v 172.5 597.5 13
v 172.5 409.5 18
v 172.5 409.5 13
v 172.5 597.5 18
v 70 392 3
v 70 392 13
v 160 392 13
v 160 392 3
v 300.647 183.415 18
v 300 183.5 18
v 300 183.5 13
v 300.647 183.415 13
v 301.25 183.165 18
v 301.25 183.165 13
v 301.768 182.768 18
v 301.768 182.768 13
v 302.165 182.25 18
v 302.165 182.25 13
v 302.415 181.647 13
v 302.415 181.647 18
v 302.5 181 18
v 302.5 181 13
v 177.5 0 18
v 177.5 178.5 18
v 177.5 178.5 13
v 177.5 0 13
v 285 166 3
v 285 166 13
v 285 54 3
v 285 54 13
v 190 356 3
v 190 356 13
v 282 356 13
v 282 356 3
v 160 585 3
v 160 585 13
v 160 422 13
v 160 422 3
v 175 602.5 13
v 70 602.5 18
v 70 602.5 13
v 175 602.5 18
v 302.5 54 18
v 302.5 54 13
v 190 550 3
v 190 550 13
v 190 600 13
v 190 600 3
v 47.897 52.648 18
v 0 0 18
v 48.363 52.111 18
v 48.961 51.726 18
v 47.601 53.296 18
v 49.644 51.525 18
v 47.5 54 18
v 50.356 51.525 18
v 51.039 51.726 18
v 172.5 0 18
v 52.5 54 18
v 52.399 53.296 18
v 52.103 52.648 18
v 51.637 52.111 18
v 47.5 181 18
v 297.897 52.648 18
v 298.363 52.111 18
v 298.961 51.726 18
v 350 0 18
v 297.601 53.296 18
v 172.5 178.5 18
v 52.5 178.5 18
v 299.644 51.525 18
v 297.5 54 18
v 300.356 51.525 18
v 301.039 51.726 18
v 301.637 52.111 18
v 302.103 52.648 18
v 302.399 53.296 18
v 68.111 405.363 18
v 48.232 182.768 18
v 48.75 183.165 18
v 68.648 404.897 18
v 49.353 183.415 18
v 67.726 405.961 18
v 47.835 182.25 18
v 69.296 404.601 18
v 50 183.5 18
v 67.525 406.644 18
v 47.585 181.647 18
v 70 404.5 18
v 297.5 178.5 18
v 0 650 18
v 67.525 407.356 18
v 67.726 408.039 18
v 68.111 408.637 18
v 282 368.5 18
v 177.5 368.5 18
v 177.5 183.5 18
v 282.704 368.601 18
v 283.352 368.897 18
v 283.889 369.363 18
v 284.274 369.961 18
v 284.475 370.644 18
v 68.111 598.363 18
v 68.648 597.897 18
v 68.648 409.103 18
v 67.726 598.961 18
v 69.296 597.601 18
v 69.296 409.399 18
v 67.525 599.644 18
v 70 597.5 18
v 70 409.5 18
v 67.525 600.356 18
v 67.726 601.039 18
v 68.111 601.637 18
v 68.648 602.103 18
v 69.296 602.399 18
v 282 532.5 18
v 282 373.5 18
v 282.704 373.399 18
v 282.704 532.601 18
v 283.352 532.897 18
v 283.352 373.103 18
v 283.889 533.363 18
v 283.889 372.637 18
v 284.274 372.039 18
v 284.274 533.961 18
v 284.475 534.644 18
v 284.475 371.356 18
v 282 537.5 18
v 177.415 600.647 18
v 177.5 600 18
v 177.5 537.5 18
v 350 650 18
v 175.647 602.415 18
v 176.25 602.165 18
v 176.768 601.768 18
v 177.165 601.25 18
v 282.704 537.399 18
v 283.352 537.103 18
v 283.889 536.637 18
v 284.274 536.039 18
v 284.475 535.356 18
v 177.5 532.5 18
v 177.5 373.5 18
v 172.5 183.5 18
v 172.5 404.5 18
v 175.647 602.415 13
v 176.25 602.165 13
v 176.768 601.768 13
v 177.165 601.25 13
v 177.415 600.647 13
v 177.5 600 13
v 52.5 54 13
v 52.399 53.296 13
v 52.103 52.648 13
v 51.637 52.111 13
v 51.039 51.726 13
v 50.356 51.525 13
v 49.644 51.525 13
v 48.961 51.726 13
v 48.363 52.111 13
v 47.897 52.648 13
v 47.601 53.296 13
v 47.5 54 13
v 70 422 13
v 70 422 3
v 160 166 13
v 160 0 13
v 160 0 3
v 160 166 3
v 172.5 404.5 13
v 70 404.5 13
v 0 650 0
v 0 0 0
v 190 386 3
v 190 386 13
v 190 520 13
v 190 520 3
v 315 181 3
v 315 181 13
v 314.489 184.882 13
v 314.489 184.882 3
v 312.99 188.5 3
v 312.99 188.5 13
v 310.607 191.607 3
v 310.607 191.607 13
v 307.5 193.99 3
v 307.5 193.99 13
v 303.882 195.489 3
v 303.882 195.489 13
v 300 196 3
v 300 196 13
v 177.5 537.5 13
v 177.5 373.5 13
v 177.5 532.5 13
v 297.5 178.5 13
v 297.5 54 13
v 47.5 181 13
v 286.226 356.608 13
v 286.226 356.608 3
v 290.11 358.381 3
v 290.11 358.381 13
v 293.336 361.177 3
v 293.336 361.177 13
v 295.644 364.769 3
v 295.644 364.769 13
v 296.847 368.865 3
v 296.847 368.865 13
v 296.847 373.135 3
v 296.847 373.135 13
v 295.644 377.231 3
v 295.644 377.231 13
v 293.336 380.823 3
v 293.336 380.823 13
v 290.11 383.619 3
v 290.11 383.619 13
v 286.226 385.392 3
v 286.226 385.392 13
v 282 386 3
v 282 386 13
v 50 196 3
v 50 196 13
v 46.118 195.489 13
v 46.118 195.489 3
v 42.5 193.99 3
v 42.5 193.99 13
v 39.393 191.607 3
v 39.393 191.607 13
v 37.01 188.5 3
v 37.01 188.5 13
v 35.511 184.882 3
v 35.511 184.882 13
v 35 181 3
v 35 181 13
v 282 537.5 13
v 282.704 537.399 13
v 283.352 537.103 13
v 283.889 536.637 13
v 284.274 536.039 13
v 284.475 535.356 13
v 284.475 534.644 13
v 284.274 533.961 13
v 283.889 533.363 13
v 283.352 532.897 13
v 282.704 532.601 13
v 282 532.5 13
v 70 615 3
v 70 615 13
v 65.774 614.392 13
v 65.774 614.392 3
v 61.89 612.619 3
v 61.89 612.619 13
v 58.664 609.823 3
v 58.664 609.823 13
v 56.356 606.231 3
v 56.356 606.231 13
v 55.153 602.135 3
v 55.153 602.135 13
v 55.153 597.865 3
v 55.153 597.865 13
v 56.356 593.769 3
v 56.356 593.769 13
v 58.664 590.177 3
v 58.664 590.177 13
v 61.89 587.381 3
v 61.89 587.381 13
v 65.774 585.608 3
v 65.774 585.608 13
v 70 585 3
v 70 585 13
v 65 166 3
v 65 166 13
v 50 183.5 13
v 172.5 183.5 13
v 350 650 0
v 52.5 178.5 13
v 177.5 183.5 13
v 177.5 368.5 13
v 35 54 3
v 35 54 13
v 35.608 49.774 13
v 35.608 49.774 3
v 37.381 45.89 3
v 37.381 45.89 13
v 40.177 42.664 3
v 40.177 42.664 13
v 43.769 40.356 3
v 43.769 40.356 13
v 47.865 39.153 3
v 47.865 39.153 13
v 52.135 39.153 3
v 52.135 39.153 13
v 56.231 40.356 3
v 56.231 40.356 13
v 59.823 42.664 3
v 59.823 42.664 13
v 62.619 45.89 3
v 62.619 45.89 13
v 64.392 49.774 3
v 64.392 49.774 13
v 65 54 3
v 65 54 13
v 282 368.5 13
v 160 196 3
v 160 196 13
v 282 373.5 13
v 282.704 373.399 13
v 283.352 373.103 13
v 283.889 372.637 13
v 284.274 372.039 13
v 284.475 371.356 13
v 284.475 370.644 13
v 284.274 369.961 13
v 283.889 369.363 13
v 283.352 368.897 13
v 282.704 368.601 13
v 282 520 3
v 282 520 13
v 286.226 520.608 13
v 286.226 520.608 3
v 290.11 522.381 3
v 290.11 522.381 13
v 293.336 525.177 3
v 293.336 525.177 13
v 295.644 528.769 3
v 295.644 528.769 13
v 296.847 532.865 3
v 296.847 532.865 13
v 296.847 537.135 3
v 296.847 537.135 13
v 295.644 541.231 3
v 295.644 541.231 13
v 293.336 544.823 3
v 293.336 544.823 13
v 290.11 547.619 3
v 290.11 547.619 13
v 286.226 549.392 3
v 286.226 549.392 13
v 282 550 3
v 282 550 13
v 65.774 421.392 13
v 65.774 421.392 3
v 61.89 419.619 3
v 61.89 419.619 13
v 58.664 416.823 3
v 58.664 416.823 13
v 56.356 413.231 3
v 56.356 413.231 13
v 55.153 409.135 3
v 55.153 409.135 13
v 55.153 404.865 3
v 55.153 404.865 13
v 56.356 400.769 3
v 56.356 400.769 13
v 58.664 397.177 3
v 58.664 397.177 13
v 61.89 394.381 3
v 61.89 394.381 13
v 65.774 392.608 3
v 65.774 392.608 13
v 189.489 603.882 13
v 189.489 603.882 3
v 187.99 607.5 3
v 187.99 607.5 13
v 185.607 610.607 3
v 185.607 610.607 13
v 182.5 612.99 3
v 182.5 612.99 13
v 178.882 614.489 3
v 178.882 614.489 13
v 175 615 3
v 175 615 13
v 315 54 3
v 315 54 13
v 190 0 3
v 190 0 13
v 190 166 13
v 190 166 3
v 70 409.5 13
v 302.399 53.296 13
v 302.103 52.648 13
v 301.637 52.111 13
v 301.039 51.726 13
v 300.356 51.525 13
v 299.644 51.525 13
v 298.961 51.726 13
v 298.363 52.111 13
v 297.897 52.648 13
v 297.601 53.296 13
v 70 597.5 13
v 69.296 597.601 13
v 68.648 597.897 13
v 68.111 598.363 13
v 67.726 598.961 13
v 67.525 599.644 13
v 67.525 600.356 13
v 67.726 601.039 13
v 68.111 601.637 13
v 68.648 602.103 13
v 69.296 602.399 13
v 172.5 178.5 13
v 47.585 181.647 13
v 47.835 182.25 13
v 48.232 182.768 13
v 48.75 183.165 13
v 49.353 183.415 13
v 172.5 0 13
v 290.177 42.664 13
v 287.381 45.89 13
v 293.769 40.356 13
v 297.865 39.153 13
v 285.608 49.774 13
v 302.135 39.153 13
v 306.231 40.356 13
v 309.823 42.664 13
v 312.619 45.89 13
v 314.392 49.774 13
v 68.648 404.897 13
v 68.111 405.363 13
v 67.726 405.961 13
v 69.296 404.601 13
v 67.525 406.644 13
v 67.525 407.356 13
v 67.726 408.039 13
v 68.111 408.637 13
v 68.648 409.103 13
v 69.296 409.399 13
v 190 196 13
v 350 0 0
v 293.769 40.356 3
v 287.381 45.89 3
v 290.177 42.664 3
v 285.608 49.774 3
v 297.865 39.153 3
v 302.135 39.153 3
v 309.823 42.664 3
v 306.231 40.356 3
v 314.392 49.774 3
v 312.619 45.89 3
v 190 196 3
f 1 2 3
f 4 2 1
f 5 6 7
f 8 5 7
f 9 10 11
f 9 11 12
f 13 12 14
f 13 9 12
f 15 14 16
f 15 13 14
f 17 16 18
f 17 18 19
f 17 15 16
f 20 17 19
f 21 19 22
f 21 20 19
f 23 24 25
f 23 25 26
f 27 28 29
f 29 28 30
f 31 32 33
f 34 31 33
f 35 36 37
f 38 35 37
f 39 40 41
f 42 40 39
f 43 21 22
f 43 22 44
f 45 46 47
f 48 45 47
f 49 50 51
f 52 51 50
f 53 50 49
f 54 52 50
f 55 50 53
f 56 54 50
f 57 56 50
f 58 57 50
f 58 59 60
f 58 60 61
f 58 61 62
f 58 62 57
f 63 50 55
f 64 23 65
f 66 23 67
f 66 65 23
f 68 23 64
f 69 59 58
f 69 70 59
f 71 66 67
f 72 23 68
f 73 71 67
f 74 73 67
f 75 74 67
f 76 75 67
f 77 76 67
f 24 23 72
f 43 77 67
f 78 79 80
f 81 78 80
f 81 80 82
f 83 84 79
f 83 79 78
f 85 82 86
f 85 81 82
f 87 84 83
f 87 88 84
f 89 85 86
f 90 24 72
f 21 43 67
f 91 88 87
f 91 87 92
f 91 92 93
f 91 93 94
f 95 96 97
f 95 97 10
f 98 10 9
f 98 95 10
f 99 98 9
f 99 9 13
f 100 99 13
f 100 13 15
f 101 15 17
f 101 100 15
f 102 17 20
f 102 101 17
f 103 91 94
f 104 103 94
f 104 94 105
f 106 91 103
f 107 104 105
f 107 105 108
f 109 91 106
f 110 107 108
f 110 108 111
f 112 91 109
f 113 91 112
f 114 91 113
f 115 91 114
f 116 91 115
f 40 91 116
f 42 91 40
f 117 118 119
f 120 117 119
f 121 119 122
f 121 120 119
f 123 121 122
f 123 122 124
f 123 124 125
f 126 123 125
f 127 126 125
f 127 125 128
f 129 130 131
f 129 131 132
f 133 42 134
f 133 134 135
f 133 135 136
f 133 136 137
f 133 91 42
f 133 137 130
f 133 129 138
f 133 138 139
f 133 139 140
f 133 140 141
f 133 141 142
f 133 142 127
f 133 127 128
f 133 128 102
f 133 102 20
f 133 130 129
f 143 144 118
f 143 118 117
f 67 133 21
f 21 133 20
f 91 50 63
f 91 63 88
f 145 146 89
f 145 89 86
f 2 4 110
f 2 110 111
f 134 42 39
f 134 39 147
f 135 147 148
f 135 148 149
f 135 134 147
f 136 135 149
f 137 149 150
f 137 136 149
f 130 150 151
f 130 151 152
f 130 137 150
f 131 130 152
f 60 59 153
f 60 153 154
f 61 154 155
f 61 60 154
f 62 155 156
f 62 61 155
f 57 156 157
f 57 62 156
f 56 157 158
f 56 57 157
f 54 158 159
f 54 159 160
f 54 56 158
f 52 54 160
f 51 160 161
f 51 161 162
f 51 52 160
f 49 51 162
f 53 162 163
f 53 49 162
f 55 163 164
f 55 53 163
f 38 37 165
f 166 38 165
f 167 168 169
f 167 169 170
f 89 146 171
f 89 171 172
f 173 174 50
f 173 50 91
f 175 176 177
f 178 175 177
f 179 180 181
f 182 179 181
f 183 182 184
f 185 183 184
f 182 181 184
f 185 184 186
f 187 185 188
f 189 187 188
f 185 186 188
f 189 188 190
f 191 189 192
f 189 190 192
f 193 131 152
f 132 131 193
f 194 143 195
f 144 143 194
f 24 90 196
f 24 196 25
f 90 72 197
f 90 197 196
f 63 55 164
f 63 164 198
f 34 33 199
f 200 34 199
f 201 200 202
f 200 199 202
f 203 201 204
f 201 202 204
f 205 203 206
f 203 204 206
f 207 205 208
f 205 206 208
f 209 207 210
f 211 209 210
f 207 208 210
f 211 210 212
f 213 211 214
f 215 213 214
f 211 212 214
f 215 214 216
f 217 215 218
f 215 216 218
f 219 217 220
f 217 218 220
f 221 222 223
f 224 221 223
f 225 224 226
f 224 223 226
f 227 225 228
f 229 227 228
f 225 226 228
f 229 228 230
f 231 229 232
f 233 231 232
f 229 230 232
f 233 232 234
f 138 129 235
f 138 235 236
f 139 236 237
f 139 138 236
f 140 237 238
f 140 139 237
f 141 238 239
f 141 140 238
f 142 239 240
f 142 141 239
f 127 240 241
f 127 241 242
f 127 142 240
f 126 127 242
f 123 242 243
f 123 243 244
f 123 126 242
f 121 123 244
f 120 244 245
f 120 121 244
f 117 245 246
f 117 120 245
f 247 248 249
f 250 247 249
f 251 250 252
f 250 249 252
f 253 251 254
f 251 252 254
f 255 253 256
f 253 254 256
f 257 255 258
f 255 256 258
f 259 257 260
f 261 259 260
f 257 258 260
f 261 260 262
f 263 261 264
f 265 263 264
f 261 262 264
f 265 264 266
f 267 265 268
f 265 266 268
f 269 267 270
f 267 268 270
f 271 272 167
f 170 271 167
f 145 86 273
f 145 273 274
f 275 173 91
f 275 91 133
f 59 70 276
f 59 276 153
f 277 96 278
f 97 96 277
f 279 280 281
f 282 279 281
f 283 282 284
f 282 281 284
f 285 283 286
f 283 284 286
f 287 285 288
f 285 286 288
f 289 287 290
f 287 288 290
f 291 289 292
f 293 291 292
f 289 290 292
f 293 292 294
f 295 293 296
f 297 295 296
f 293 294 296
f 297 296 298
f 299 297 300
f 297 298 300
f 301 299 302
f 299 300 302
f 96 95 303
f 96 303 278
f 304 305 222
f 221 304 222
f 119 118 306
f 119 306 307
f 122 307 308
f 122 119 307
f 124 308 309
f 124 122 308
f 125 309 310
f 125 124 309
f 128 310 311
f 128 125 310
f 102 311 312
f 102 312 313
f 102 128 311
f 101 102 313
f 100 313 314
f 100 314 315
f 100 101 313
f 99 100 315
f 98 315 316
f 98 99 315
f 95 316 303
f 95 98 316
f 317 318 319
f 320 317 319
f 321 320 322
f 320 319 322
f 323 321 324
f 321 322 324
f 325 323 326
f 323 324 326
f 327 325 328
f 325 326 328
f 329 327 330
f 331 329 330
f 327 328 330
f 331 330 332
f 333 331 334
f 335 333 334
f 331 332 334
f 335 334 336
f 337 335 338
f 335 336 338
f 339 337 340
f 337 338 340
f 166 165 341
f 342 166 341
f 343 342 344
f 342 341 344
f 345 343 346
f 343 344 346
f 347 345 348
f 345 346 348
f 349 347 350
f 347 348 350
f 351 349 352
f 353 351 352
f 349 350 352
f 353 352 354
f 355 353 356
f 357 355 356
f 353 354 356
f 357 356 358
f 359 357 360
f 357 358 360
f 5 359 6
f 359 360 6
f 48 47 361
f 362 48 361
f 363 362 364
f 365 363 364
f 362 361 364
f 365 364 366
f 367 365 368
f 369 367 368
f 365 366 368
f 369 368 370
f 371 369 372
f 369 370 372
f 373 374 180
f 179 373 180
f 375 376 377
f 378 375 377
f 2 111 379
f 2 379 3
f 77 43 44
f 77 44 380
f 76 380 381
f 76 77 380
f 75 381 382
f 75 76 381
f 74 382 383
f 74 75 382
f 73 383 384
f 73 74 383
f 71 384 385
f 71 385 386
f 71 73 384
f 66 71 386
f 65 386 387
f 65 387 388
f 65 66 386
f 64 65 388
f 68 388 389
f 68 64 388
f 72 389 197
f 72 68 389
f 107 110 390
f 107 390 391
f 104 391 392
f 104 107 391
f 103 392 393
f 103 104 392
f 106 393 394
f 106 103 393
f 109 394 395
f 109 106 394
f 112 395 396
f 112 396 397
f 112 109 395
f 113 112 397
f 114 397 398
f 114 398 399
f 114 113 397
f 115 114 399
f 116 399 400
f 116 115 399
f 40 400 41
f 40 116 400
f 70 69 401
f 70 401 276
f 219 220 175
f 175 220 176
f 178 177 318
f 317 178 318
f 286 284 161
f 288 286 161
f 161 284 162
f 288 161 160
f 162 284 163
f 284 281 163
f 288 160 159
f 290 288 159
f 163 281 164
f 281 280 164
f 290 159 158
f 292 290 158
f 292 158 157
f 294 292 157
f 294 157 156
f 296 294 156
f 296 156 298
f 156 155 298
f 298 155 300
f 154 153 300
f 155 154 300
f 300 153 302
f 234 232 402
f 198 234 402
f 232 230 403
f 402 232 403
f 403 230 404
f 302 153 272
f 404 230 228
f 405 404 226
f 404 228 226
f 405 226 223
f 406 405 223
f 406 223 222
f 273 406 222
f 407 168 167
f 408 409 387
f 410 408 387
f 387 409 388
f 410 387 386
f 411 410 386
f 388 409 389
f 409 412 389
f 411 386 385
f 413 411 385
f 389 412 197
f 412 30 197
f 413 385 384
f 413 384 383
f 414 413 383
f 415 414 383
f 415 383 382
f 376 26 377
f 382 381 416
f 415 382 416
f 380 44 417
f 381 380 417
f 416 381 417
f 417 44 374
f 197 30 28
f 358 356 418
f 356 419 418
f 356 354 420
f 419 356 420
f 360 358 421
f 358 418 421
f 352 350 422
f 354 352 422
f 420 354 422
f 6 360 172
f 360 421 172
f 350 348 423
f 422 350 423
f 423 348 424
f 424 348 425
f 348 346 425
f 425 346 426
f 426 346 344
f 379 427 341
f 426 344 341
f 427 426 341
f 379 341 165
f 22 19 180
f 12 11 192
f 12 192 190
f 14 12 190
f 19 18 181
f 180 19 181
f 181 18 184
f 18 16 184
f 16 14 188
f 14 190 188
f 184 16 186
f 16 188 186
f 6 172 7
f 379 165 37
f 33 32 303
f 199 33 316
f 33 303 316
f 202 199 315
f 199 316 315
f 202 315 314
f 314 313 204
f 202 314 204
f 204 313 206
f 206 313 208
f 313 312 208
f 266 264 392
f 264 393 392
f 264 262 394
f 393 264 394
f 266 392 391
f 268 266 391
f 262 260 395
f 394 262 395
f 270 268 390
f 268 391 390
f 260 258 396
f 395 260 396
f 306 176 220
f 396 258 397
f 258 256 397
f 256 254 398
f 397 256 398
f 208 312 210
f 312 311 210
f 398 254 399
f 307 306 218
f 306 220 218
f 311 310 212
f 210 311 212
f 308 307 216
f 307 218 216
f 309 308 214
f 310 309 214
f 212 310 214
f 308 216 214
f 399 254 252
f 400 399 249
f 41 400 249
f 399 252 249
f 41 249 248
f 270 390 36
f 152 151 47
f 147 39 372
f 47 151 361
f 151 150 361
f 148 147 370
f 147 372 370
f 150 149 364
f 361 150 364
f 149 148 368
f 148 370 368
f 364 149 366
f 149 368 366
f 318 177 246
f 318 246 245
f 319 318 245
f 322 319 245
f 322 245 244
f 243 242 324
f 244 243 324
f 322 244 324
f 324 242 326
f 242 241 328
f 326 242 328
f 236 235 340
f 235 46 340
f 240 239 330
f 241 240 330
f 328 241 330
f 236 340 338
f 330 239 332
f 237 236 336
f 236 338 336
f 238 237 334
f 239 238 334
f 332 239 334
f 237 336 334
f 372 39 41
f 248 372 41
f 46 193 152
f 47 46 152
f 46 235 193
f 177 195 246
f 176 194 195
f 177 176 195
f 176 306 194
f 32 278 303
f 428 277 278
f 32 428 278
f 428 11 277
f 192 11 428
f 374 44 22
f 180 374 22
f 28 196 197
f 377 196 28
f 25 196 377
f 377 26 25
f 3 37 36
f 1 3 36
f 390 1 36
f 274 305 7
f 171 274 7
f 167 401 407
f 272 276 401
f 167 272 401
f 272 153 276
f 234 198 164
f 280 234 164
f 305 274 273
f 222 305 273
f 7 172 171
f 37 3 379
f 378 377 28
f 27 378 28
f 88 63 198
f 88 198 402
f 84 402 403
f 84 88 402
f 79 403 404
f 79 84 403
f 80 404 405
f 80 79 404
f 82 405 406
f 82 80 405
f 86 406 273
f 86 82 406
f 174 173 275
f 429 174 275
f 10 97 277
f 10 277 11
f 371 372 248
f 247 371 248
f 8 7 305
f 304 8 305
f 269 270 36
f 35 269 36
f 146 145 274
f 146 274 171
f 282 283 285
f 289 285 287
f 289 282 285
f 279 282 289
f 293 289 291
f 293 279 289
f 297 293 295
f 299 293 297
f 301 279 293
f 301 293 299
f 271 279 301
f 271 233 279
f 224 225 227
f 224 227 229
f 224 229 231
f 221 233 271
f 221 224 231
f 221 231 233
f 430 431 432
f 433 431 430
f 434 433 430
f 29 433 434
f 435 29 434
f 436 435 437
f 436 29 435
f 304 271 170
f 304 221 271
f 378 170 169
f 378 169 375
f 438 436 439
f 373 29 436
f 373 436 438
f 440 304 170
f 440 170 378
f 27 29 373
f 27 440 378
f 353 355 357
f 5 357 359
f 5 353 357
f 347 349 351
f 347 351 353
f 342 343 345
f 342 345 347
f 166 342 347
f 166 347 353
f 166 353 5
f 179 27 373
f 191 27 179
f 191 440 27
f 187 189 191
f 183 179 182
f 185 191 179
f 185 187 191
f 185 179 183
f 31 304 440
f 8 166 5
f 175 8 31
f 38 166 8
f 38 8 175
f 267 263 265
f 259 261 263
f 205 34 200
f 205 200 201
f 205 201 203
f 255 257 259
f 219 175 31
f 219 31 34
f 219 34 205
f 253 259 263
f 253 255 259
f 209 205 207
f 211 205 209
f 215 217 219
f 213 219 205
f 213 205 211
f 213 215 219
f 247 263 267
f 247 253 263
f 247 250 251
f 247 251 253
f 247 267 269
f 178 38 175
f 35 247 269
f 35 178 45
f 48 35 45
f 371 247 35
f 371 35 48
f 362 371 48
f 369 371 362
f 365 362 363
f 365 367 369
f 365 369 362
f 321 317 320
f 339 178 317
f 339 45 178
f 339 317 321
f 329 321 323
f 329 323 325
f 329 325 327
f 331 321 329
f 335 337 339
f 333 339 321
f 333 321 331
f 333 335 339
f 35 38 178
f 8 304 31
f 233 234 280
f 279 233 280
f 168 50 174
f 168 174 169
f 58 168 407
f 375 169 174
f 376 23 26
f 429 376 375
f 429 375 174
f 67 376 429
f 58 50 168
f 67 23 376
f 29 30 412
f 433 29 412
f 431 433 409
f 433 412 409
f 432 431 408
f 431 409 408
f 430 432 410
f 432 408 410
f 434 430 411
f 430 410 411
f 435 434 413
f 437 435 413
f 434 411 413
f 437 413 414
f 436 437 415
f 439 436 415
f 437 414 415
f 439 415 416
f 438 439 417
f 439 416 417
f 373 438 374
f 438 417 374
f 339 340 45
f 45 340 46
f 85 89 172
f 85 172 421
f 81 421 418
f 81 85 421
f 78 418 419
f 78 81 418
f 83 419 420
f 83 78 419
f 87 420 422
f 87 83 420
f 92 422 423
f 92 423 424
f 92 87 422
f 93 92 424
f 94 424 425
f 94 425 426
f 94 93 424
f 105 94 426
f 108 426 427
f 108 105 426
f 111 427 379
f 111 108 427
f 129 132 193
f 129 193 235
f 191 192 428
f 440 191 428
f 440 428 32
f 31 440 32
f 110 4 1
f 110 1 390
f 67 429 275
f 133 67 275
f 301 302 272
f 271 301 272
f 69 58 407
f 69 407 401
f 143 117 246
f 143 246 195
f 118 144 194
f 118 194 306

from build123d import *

# Parameters (mm, degrees)
SKICA1_W                 = 350
SKICA1_H                 = 650
P_IDAT_VYSUNUT_M2_DEPTH  = 18
VETSI_W                  = 30
VETSI_H                  = 166
VETSI_H_2                = 30
ODEBRAT_VYSUNUT_M1_DEPTH = 15
P_IDAT_VYSUNUT_M3_DEPTH  = 5


with BuildPart() as part:
    # Skica1 → Přidat vysunutím2 (new body)
    with BuildSketch(Plane.XY):
        with Locations((175, 325)):
            Rectangle(SKICA1_W, SKICA1_H)
    extrude(amount=P_IDAT_VYSUNUT_M2_DEPTH)

    # vetsi → Odebrat vysunutím1 (cut)
    with BuildSketch(Plane.XY.offset(18)):
        with BuildLine():
            Line((65, 54), (65, 166))
            Line((65, 166), (50, 166))
            ThreePointArc((50, 166), (39.393398282, 170.393398282), (35, 181))
            Line((35, 181), (35, 54))
            ThreePointArc((35, 54), (50, 39), (65, 54))
        make_face()
        with BuildLine():
            ThreePointArc((65, 181), (60.606601718, 191.606601718), (50, 196))
            ThreePointArc((50, 196), (39.393398282, 191.606601718), (35, 181))
            ThreePointArc((35, 181), (39.393398282, 170.393398282), (50, 166))
            Line((50, 166), (65, 166))
            Line((65, 166), (65, 181))
        make_face()
        with BuildLine():
            Line((160, 166), (160, 196))
            Line((160, 196), (50, 196))
            ThreePointArc((50, 196), (60.606601718, 191.606601718), (65, 181))
            Line((65, 181), (65, 166))
            Line((65, 166), (160, 166))
        make_face()
        with Locations((175, 83)):
            Rectangle(VETSI_W, VETSI_H)
        with Locations((175, 181)):
            Rectangle(VETSI_W, VETSI_H_2)
        with BuildLine():
            Line((300, 196), (190, 196))
            Line((190, 196), (190, 166))
            Line((190, 166), (285, 166))
            Line((285, 166), (285, 181))
            ThreePointArc((285, 181), (289.393398282, 191.606601718), (300, 196))
        make_face()
        with BuildLine():
            ThreePointArc((315, 181), (310.606601718, 191.606601718), (300, 196))
            ThreePointArc((300, 196), (289.393398282, 191.606601718), (285, 181))
            Line((285, 181), (285, 166))
            Line((285, 166), (300, 166))
            ThreePointArc((300, 166), (310.606601718, 170.393398282), (315, 181))
        make_face()
        with BuildLine():
            Line((300, 166), (285, 166))
            Line((285, 166), (285, 54))
            ThreePointArc((285, 54), (300, 39), (315, 54))
            Line((315, 54), (315, 181))
            ThreePointArc((315, 181), (310.606601718, 170.393398282), (300, 166))
        make_face()
        with BuildLine():
            Line((190, 196), (190, 356))
            Line((190, 356), (175, 356))
            ThreePointArc((175, 356), (164.393398282, 360.393398282), (160, 371))
            Line((160, 371), (160, 196))
            Line((160, 196), (190, 196))
        make_face()
        with BuildLine():
            Line((282, 386), (190, 386))
            Line((190, 386), (190, 356))
            Line((190, 356), (282, 356))
            ThreePointArc((282, 356), (297, 371), (282, 386))
        make_face()
        with BuildLine():
            Line((190, 356), (190, 386))
            Line((190, 386), (175, 386))
            ThreePointArc((175, 386), (164.393398282, 381.606601718), (160, 371))
            ThreePointArc((160, 371), (164.393398282, 360.393398282), (175, 356))
            Line((175, 356), (190, 356))
        make_face()
        with BuildLine():
            Line((190, 386), (190, 407.000000086))
            ThreePointArc((190, 407.000000086), (185.606601748, 396.393398312), (175, 392))
            Line((175, 392), (160, 392))
            Line((160, 392), (160, 371))
            ThreePointArc((160, 371), (164.393398282, 381.606601718), (175, 386))
            Line((175, 386), (190, 386))
        make_face()
        with BuildLine():
            ThreePointArc((175, 392), (185.606601748, 396.393398312), (190, 407.000000086))
            ThreePointArc((190, 407.000000086), (185.606601688, 417.606601748), (175, 422))
            Line((175, 422), (160, 422))
            Line((160, 422), (160, 392))
            Line((160, 392), (175, 392))
        make_face()
        with BuildLine():
            Line((160, 392), (160, 422))
            Line((160, 422), (70, 422))
            ThreePointArc((70, 422), (55, 407), (70, 392))
            Line((70, 392), (160, 392))
        make_face()
        with BuildLine():
            Line((190, 407.000000086), (190, 520))
            Line((190, 520), (175, 520))
            ThreePointArc((175, 520), (164.393398282, 524.393398282), (160, 535))
            Line((160, 535), (160, 422))
            Line((160, 422), (175, 422))
            ThreePointArc((175, 422), (185.606601688, 417.606601748), (190, 407.000000086))
        make_face()
        with BuildLine():
            Line((190, 520), (190, 550))
            Line((190, 550), (175, 550))
            ThreePointArc((175, 550), (164.393398282, 545.606601718), (160, 535))
            ThreePointArc((160, 535), (164.393398282, 524.393398282), (175, 520))
            Line((175, 520), (190, 520))
        make_face()
        with BuildLine():
            Line((282, 550), (190, 550))
            Line((190, 550), (190, 520))
            Line((190, 520), (282, 520))
            ThreePointArc((282, 520), (297, 535), (282, 550))
        make_face()
        with BuildLine():
            Line((190, 550), (190, 600))
            ThreePointArc((190, 600), (185.606601718, 589.393398282), (175, 585))
            Line((175, 585), (160, 585))
            Line((160, 585), (160, 535))
            ThreePointArc((160, 535), (164.393398282, 545.606601718), (175, 550))
            Line((175, 550), (190, 550))
        make_face()
        with BuildLine():
            ThreePointArc((175, 585), (185.606601718, 589.393398282), (190, 600))
            ThreePointArc((190, 600), (185.606601718, 610.606601718), (175, 615))
            ThreePointArc((175, 615), (164.393398282, 610.606601718), (160, 600))
            Line((160, 600), (160, 585))
            Line((160, 585), (175, 585))
        make_face()
        with BuildLine():
            ThreePointArc((160, 600), (164.393398282, 610.606601718), (175, 615))
            Line((175, 615), (70, 615))
            ThreePointArc((70, 615), (55, 600), (70, 585))
            Line((70, 585), (160, 585))
            Line((160, 585), (160, 600))
        make_face()
    extrude(amount=-ODEBRAT_VYSUNUT_M1_DEPTH, mode=Mode.SUBTRACT)

    # mensi → Přidat vysunutím3 (add)
    with BuildSketch(Plane.XY.offset(18)):
        with BuildLine():
            ThreePointArc((175, 602.5), (176.767766953, 601.767766953), (177.5, 600))
            Line((177.5, 600), (177.5, 537.5))
            Line((177.5, 537.5), (282, 537.5))
            ThreePointArc((282, 537.5), (284.5, 535), (282, 532.5))
            Line((282, 532.5), (177.5, 532.5))
            Line((177.5, 532.5), (177.5, 406.999999943))
            Line((177.5, 406.999999943), (177.5, 373.5))
            Line((177.5, 373.5), (282, 373.5))
            ThreePointArc((282, 373.5), (284.5, 371), (282, 368.5))
            Line((282, 368.5), (177.5, 368.5))
            Line((177.5, 368.5), (177.5, 183.5))
            Line((177.5, 183.5), (300, 183.5))
            ThreePointArc((300, 183.5), (301.767766953, 182.767766953), (302.5, 181))
            Line((302.5, 181), (302.5, 54))
            ThreePointArc((302.5, 54), (300, 51.5), (297.5, 54))
            Line((297.5, 54), (297.5, 178.5))
            Line((297.5, 178.5), (177.5, 178.5))
            Line((177.5, 178.5), (177.5, 0))
            Line((177.5, 0), (350, 0))
            Line((350, 0), (350, 650))
            Line((350, 650), (0, 650))
            Line((0, 650), (0, 0))
            Line((0, 0), (172.5, 0))
            Line((172.5, 0), (172.5, 178.5))
            Line((172.5, 178.5), (52.5, 178.5))
            Line((52.5, 178.5), (52.5, 54))
            ThreePointArc((52.5, 54), (50, 51.5), (47.5, 54))
            Line((47.5, 54), (47.5, 181))
            ThreePointArc((47.5, 181), (48.232233047, 182.767766953), (50, 183.5))
            Line((50, 183.5), (172.5, 183.5))
            Line((172.5, 183.5), (172.5, 371))
            Line((172.5, 371), (172.5, 404.5))
            Line((172.5, 404.5), (70, 404.5))
            ThreePointArc((70, 404.5), (67.5, 407), (70, 409.5))
            Line((70, 409.5), (172.5, 409.5))
            Line((172.5, 409.5), (172.5, 535))
            Line((172.5, 535), (172.5, 597.5))
            Line((172.5, 597.5), (70, 597.5))
            ThreePointArc((70, 597.5), (67.5, 600), (70, 602.5))
            Line((70, 602.5), (175, 602.5))
        make_face()
    extrude(amount=-P_IDAT_VYSUNUT_M3_DEPTH)


solid = part.part
